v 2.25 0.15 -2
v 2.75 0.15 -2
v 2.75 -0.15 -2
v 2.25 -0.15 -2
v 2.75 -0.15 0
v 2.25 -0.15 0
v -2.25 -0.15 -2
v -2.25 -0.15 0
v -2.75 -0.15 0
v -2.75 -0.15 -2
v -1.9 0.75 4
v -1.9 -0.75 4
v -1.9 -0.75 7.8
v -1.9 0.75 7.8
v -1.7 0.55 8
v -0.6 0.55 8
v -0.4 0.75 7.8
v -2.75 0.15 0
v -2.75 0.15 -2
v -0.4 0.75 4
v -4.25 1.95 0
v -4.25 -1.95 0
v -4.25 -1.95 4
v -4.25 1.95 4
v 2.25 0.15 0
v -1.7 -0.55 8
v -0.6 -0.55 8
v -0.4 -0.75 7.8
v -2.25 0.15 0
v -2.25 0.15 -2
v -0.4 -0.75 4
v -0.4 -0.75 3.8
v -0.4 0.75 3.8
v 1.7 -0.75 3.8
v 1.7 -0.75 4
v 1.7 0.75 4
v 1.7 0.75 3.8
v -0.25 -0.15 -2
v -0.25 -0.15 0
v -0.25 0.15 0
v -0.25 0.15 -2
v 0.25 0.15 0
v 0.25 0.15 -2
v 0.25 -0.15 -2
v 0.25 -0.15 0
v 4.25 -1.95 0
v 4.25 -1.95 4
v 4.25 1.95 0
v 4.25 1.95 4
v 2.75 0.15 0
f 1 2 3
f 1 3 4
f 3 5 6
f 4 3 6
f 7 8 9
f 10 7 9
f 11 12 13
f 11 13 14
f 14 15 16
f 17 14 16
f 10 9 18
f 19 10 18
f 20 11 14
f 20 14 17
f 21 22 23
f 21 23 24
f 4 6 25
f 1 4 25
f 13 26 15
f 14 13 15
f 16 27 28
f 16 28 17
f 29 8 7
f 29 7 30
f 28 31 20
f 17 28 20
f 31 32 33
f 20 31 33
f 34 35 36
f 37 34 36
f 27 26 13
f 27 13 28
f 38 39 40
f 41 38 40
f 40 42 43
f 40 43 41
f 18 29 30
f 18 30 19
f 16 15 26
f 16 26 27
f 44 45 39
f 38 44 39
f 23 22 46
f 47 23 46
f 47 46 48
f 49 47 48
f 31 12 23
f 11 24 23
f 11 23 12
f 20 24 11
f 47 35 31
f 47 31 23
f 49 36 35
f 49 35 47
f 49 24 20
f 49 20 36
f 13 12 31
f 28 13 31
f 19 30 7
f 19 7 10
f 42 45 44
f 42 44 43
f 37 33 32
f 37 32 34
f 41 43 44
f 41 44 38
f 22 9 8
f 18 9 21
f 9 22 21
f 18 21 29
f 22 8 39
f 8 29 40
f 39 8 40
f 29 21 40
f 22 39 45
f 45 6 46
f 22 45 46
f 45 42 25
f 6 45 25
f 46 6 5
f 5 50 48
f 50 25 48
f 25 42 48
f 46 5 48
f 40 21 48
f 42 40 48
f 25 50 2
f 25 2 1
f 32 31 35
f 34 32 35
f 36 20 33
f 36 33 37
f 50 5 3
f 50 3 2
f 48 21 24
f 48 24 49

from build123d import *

# Parameters (mm, degrees)
SKETCH1_W           = 8.5
SKETCH1_H           = 3.9
BOSS_EXTRUDE1_DEPTH = 4
SKETCH2_W           = 1.5
SKETCH2_H           = 1.5
BOSS_EXTRUDE2_DEPTH = 4
CHAMFER1_SIZE       = 0.2
SKETCH3_W           = 2.1
SKETCH3_H           = 1.5
CUT_EXTRUDE1_DEPTH  = 0.2
SKETCH4_W           = 0.5
SKETCH4_H           = 0.3
BOSS_EXTRUDE3_DEPTH = 2


with BuildPart() as part:
    # Sketch1 → Boss-Extrude1 (new body)
    with BuildSketch(Plane.XY):
        Rectangle(SKETCH1_W, SKETCH1_H)
    extrude(amount=BOSS_EXTRUDE1_DEPTH)

    # Sketch2 → Boss-Extrude2 (add)
    with BuildSketch(Plane.XY.offset(4)):
        with Locations((-1.15, 0)):
            Rectangle(SKETCH2_W, SKETCH2_H)
    extrude(amount=BOSS_EXTRUDE2_DEPTH)

    # Chamfer1
    chamfer1_edges = [part.edges().sort_by_distance(p)[0] for p in [
        (-0.4, 0, 8),
        (-1.15, 0.75, 8),
        (-1.9, 0, 8),
        (-1.15, -0.75, 8),
    ]]
    chamfer(chamfer1_edges, length=CHAMFER1_SIZE)

    # Sketch3 → Cut-Extrude1 (cut)
    with BuildSketch(Plane.XY.offset(4)):
        with Locations((0.65, 0)):
            Rectangle(SKETCH3_W, SKETCH3_H)
    extrude(amount=-CUT_EXTRUDE1_DEPTH, mode=Mode.SUBTRACT)

    # Sketch4 → Boss-Extrude3 (add)
    with BuildSketch(Plane(origin=(0, 0, 0), x_dir=(-1, 0, 0), z_dir=(0, 0, -1))):
        Rectangle(SKETCH4_W, SKETCH4_H)
        with Locations((2.5, 0)):
            Rectangle(SKETCH4_W, SKETCH4_H)
        with Locations((-2.5, 0)):
            Rectangle(SKETCH4_W, SKETCH4_H)
    extrude(amount=BOSS_EXTRUDE3_DEPTH)


solid = part.part
